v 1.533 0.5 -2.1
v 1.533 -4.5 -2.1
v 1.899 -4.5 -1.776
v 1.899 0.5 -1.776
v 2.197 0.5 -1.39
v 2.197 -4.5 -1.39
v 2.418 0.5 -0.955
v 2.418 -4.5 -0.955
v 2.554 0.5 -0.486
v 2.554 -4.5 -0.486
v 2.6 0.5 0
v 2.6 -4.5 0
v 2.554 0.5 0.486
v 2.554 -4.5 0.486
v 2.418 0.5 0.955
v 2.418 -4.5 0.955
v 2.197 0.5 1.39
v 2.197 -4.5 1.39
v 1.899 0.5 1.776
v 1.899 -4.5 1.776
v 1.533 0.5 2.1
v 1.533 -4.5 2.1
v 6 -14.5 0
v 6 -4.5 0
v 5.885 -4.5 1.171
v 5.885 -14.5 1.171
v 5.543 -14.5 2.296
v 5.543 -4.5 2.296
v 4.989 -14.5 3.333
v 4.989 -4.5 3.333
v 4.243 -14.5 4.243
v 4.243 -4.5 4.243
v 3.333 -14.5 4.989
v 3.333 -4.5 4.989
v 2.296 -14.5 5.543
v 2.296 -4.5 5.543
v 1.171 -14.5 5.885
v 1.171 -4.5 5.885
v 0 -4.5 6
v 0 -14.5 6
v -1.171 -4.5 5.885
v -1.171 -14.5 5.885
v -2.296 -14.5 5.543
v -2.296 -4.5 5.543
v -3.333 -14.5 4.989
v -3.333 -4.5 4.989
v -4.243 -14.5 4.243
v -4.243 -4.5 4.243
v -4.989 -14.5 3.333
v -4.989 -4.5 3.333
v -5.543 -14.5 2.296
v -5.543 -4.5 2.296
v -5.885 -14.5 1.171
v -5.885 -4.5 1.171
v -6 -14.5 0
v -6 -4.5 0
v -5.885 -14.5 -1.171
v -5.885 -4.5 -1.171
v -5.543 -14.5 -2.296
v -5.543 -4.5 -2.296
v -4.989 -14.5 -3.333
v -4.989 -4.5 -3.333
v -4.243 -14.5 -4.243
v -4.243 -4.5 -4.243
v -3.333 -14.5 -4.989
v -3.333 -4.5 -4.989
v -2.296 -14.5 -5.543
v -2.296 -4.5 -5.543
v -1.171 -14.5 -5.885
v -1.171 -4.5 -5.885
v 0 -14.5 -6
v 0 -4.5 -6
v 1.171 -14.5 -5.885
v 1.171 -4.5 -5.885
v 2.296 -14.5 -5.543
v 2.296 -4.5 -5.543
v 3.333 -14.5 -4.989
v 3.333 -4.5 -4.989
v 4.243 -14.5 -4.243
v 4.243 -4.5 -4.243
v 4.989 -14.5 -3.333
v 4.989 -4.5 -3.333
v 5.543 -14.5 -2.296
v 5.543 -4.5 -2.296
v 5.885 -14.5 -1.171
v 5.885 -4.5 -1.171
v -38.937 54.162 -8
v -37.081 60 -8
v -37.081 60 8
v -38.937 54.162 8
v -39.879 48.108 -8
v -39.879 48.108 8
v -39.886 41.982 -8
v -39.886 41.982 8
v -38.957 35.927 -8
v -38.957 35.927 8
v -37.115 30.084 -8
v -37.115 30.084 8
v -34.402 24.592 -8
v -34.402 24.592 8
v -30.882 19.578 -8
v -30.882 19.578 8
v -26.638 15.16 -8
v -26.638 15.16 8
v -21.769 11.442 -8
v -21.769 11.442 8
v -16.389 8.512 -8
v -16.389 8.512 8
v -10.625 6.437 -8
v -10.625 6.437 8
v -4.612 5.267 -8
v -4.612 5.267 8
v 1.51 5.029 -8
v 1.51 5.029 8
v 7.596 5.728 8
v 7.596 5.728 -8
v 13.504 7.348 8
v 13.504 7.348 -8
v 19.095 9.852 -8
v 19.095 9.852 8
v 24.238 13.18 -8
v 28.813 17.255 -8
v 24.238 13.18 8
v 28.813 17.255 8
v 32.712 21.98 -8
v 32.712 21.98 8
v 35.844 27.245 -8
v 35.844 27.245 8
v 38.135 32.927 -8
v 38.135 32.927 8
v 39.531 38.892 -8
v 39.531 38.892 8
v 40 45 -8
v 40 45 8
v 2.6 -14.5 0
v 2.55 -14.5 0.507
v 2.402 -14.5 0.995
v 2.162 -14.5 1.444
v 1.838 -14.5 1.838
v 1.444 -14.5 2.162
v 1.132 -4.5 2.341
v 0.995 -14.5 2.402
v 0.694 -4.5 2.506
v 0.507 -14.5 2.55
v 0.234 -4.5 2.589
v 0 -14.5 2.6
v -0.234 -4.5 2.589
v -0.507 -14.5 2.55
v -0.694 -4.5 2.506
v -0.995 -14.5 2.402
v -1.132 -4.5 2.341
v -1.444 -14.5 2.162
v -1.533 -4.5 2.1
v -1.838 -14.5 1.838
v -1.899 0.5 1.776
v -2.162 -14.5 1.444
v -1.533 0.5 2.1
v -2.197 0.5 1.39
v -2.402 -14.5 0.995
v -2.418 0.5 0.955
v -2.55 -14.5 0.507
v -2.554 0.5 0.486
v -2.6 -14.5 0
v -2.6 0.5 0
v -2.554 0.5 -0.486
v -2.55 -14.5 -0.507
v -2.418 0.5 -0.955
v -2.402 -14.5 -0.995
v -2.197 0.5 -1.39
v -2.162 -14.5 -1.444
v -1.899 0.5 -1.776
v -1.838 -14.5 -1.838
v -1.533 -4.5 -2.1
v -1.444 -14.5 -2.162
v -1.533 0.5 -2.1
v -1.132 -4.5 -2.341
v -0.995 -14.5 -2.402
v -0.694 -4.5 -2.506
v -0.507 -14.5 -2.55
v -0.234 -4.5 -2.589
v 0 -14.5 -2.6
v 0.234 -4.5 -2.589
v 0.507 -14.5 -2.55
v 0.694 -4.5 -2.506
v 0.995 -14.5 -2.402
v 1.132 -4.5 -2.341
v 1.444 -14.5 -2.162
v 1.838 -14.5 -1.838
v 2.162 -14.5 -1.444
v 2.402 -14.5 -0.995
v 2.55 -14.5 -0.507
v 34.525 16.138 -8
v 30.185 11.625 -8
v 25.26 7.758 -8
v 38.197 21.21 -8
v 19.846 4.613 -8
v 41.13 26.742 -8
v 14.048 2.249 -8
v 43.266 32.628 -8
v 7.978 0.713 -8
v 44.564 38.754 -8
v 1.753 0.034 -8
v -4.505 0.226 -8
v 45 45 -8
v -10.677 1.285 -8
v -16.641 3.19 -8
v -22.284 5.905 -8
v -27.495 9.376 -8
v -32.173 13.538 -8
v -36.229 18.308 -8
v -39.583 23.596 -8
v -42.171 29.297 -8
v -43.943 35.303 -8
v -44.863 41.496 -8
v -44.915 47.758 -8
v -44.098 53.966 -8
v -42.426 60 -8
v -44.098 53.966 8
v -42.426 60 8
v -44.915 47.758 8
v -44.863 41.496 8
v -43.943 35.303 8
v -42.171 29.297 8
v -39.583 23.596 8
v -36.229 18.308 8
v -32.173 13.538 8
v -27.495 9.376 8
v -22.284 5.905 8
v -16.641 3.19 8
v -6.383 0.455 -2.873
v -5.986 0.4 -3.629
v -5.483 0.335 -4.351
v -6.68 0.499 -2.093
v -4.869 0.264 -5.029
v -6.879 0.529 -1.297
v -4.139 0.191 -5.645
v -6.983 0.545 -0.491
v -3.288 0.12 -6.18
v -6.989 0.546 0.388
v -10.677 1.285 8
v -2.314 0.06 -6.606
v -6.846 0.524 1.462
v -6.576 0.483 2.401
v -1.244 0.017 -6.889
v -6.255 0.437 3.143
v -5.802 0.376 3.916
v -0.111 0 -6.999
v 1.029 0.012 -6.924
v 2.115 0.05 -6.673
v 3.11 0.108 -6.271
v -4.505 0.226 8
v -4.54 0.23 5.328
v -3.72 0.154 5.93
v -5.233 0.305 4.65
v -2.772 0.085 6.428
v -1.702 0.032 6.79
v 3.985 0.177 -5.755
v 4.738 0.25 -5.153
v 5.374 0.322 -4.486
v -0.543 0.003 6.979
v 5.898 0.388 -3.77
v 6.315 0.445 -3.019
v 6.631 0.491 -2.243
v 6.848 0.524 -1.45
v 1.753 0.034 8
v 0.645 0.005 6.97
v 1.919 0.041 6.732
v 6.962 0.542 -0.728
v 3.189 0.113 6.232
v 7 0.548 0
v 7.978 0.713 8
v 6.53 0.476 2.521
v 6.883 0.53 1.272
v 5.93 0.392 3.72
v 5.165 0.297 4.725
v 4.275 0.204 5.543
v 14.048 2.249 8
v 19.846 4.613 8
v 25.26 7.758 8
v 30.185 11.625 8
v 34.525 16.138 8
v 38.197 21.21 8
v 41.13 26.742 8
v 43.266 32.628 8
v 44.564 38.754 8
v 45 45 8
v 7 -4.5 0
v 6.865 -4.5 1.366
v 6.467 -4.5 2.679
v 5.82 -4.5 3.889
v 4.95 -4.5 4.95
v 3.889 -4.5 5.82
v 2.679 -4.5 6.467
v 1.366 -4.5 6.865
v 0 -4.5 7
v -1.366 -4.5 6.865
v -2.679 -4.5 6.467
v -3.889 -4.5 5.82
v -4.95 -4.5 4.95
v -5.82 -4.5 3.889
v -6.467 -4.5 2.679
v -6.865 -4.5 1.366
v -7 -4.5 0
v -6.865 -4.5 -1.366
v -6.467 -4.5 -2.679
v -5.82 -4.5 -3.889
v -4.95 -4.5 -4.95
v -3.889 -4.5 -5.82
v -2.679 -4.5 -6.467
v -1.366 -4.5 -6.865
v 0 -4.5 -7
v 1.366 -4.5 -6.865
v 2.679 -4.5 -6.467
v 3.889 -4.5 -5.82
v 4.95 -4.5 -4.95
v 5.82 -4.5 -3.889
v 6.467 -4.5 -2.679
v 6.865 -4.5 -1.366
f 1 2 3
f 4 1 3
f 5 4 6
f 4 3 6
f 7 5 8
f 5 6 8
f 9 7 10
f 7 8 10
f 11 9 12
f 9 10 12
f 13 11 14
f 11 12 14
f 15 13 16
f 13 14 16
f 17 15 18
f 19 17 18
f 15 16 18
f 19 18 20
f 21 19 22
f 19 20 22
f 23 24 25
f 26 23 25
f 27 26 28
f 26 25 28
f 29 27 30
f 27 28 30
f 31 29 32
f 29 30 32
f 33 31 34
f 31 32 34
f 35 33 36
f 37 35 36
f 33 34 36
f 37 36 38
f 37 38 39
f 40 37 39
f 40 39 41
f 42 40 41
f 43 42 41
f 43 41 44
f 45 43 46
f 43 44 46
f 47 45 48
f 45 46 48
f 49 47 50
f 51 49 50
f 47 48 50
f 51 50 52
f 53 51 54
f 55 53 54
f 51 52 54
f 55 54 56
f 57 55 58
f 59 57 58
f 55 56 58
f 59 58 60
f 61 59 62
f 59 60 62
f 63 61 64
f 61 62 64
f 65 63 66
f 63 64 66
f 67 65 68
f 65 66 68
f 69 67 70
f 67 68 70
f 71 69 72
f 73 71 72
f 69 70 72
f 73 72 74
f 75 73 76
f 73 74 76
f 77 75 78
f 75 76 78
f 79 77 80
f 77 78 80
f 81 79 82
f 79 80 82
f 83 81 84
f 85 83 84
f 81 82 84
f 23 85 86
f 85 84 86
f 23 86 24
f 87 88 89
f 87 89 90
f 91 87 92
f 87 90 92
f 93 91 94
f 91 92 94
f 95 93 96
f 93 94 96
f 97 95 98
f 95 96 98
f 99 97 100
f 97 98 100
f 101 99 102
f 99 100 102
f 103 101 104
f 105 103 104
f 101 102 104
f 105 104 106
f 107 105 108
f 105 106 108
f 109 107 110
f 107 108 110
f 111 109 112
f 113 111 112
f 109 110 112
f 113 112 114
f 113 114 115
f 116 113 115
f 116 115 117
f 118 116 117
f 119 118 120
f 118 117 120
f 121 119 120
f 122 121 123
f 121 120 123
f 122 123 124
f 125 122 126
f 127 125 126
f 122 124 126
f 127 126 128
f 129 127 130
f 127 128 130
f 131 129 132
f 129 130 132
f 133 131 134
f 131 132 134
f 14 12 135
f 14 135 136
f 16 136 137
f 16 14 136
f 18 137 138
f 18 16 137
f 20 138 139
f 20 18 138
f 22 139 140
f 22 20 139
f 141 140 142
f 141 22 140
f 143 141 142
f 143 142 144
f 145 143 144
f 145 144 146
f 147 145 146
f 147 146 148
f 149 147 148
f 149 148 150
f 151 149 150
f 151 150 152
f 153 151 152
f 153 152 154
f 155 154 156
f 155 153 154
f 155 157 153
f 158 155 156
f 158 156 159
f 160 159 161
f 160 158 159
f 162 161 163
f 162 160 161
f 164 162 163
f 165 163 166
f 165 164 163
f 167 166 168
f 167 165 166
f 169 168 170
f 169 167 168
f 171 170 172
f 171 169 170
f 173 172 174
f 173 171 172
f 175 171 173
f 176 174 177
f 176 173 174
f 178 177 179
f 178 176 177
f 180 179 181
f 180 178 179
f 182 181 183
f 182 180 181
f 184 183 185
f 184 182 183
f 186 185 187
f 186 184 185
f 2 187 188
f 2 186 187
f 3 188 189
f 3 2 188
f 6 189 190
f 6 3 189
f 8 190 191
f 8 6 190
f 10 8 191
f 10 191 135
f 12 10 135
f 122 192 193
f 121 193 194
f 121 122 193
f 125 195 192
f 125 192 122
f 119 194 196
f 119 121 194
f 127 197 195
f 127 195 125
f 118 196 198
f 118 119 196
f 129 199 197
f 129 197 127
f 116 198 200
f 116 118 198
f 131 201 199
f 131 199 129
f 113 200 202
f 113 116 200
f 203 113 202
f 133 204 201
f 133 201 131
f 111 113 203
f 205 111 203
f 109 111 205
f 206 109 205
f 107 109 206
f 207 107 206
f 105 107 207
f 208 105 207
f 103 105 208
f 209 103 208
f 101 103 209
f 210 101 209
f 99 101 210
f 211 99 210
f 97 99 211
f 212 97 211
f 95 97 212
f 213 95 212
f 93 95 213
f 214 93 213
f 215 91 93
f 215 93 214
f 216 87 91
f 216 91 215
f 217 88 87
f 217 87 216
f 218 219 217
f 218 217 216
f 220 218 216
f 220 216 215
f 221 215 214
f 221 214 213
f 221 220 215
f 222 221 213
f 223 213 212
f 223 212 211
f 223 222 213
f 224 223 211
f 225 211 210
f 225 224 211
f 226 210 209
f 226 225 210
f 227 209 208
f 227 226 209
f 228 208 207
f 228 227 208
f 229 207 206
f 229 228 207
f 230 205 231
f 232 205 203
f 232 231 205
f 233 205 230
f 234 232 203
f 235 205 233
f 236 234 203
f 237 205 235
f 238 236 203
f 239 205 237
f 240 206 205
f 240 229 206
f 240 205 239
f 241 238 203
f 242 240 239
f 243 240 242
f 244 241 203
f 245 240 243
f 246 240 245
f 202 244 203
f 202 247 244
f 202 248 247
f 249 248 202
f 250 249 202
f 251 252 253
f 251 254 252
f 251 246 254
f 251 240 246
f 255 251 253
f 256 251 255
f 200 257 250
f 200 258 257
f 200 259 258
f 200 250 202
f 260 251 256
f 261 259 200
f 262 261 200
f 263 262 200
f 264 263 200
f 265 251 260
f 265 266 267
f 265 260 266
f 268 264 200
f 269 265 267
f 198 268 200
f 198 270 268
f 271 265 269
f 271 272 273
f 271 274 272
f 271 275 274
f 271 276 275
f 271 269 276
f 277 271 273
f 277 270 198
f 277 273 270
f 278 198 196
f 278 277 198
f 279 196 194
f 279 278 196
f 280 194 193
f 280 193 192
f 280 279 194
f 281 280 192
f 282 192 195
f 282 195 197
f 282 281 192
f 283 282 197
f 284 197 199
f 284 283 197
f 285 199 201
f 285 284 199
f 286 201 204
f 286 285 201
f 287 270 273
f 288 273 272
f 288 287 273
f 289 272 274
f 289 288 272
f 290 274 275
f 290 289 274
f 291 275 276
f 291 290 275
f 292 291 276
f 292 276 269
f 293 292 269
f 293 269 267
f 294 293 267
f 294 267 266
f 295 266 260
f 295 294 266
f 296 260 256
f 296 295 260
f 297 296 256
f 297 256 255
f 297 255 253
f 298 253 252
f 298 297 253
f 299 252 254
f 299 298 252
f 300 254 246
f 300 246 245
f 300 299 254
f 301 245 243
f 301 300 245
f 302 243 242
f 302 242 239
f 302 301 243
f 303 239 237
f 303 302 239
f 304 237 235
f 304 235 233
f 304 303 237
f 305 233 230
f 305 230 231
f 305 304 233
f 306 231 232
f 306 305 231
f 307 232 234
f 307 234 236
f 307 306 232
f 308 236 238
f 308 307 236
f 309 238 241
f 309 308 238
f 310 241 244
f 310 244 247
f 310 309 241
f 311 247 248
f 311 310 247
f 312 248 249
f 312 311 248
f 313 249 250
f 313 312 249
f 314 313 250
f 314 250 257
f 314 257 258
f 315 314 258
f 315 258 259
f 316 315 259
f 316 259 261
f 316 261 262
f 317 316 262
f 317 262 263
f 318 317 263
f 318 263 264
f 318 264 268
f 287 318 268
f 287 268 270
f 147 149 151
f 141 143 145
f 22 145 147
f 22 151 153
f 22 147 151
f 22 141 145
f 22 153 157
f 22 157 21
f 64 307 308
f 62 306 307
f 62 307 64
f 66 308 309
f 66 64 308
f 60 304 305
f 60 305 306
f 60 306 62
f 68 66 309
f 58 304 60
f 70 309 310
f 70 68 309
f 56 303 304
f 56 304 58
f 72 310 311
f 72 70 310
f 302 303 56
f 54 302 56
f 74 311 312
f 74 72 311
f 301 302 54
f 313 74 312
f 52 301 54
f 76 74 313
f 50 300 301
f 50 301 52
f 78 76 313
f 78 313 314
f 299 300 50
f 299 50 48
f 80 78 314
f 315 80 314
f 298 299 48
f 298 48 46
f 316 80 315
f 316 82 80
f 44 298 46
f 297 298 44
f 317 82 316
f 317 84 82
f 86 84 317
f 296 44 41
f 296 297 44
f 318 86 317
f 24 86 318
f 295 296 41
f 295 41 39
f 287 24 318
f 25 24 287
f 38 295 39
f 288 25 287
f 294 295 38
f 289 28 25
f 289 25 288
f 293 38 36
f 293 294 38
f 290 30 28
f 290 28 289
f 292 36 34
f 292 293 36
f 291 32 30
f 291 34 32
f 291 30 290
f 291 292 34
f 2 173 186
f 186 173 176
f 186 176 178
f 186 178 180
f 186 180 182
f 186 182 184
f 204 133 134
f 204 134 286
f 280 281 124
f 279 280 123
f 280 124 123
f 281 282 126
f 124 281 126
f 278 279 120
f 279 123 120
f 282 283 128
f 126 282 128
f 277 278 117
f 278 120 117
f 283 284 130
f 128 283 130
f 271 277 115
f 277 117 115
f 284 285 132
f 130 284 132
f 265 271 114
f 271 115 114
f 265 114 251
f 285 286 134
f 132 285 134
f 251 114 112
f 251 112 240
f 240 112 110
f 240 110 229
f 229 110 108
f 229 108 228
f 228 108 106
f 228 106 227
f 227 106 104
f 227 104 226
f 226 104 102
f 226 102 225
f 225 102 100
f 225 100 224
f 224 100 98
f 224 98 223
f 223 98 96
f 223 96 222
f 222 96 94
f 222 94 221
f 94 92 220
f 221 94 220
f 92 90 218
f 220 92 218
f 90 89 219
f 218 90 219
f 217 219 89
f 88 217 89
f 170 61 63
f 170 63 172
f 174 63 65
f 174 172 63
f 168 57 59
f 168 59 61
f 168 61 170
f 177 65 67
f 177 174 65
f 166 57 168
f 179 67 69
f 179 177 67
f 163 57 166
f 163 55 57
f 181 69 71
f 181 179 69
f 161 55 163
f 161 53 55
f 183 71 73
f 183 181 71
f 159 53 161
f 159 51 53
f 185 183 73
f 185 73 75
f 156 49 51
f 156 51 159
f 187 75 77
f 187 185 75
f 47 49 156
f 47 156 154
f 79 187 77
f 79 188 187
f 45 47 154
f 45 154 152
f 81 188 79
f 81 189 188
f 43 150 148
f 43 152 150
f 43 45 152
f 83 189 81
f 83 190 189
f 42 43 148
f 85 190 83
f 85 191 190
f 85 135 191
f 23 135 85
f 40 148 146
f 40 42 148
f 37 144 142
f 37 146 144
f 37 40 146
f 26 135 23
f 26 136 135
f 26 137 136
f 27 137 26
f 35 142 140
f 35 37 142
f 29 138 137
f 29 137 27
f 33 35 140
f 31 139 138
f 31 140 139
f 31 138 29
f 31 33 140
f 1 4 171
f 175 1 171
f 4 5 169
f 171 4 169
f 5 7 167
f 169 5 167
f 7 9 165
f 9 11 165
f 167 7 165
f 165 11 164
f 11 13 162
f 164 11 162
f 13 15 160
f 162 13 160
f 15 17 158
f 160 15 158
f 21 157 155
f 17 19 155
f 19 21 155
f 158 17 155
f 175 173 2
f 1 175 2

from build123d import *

# Parameters (mm, degrees)
PAD_DEPTH     = 8
SKETCH002_R   = 7
PAD001_DEPTH  = 4.5
POCKET_DEPTH  = 5
SKETCH005_R   = 6
SKETCH005_R_2 = 2.6
PAD002_DEPTH  = 10


with BuildPart() as part:
    # Sketch001 → Pad (new body, symmetric)
    with BuildSketch(Plane.XY):
        with BuildLine():
            ThreePointArc((-37.080992, 60), (-7.64069, 5.736533), (40, 45))
            Line((40, 45), (45, 45))
            ThreePointArc((-42.426407, 60), (-7.609589, 0.648065), (45, 45))
            Line((-42.426407, 60), (-37.080992, 60))
        make_face()
    extrude(amount=PAD_DEPTH, both=True)

    # Sketch002 → Pad001 (join, symmetric)
    with BuildSketch(Plane.XZ):
        Circle(SKETCH002_R)
    extrude(amount=PAD001_DEPTH, both=True)

    # Sketch004 (on Face8 of Pad001) → Pocket (cut)
    with BuildSketch(Plane.XZ.offset(4.5)):
        with BuildLine():
            Line((-1.532971, 2.1), (1.532971, 2.1))
            ThreePointArc((1.532971, -2.1), (2.6, 0), (1.532971, 2.1))
            Line((-1.532971, -2.1), (1.532971, -2.1))
            ThreePointArc((-1.532971, 2.1), (-2.6, 0), (-1.532971, -2.1))
        make_face()
    extrude(amount=-POCKET_DEPTH, mode=Mode.SUBTRACT)

    # Sketch005 (on Face8 of Pocket) → Pad002 (join)
    with BuildSketch(Plane.XZ.offset(4.5)):
        Circle(SKETCH005_R)
        Circle(SKETCH005_R_2, mode=Mode.SUBTRACT)
    extrude(amount=PAD002_DEPTH)


solid = part.part
